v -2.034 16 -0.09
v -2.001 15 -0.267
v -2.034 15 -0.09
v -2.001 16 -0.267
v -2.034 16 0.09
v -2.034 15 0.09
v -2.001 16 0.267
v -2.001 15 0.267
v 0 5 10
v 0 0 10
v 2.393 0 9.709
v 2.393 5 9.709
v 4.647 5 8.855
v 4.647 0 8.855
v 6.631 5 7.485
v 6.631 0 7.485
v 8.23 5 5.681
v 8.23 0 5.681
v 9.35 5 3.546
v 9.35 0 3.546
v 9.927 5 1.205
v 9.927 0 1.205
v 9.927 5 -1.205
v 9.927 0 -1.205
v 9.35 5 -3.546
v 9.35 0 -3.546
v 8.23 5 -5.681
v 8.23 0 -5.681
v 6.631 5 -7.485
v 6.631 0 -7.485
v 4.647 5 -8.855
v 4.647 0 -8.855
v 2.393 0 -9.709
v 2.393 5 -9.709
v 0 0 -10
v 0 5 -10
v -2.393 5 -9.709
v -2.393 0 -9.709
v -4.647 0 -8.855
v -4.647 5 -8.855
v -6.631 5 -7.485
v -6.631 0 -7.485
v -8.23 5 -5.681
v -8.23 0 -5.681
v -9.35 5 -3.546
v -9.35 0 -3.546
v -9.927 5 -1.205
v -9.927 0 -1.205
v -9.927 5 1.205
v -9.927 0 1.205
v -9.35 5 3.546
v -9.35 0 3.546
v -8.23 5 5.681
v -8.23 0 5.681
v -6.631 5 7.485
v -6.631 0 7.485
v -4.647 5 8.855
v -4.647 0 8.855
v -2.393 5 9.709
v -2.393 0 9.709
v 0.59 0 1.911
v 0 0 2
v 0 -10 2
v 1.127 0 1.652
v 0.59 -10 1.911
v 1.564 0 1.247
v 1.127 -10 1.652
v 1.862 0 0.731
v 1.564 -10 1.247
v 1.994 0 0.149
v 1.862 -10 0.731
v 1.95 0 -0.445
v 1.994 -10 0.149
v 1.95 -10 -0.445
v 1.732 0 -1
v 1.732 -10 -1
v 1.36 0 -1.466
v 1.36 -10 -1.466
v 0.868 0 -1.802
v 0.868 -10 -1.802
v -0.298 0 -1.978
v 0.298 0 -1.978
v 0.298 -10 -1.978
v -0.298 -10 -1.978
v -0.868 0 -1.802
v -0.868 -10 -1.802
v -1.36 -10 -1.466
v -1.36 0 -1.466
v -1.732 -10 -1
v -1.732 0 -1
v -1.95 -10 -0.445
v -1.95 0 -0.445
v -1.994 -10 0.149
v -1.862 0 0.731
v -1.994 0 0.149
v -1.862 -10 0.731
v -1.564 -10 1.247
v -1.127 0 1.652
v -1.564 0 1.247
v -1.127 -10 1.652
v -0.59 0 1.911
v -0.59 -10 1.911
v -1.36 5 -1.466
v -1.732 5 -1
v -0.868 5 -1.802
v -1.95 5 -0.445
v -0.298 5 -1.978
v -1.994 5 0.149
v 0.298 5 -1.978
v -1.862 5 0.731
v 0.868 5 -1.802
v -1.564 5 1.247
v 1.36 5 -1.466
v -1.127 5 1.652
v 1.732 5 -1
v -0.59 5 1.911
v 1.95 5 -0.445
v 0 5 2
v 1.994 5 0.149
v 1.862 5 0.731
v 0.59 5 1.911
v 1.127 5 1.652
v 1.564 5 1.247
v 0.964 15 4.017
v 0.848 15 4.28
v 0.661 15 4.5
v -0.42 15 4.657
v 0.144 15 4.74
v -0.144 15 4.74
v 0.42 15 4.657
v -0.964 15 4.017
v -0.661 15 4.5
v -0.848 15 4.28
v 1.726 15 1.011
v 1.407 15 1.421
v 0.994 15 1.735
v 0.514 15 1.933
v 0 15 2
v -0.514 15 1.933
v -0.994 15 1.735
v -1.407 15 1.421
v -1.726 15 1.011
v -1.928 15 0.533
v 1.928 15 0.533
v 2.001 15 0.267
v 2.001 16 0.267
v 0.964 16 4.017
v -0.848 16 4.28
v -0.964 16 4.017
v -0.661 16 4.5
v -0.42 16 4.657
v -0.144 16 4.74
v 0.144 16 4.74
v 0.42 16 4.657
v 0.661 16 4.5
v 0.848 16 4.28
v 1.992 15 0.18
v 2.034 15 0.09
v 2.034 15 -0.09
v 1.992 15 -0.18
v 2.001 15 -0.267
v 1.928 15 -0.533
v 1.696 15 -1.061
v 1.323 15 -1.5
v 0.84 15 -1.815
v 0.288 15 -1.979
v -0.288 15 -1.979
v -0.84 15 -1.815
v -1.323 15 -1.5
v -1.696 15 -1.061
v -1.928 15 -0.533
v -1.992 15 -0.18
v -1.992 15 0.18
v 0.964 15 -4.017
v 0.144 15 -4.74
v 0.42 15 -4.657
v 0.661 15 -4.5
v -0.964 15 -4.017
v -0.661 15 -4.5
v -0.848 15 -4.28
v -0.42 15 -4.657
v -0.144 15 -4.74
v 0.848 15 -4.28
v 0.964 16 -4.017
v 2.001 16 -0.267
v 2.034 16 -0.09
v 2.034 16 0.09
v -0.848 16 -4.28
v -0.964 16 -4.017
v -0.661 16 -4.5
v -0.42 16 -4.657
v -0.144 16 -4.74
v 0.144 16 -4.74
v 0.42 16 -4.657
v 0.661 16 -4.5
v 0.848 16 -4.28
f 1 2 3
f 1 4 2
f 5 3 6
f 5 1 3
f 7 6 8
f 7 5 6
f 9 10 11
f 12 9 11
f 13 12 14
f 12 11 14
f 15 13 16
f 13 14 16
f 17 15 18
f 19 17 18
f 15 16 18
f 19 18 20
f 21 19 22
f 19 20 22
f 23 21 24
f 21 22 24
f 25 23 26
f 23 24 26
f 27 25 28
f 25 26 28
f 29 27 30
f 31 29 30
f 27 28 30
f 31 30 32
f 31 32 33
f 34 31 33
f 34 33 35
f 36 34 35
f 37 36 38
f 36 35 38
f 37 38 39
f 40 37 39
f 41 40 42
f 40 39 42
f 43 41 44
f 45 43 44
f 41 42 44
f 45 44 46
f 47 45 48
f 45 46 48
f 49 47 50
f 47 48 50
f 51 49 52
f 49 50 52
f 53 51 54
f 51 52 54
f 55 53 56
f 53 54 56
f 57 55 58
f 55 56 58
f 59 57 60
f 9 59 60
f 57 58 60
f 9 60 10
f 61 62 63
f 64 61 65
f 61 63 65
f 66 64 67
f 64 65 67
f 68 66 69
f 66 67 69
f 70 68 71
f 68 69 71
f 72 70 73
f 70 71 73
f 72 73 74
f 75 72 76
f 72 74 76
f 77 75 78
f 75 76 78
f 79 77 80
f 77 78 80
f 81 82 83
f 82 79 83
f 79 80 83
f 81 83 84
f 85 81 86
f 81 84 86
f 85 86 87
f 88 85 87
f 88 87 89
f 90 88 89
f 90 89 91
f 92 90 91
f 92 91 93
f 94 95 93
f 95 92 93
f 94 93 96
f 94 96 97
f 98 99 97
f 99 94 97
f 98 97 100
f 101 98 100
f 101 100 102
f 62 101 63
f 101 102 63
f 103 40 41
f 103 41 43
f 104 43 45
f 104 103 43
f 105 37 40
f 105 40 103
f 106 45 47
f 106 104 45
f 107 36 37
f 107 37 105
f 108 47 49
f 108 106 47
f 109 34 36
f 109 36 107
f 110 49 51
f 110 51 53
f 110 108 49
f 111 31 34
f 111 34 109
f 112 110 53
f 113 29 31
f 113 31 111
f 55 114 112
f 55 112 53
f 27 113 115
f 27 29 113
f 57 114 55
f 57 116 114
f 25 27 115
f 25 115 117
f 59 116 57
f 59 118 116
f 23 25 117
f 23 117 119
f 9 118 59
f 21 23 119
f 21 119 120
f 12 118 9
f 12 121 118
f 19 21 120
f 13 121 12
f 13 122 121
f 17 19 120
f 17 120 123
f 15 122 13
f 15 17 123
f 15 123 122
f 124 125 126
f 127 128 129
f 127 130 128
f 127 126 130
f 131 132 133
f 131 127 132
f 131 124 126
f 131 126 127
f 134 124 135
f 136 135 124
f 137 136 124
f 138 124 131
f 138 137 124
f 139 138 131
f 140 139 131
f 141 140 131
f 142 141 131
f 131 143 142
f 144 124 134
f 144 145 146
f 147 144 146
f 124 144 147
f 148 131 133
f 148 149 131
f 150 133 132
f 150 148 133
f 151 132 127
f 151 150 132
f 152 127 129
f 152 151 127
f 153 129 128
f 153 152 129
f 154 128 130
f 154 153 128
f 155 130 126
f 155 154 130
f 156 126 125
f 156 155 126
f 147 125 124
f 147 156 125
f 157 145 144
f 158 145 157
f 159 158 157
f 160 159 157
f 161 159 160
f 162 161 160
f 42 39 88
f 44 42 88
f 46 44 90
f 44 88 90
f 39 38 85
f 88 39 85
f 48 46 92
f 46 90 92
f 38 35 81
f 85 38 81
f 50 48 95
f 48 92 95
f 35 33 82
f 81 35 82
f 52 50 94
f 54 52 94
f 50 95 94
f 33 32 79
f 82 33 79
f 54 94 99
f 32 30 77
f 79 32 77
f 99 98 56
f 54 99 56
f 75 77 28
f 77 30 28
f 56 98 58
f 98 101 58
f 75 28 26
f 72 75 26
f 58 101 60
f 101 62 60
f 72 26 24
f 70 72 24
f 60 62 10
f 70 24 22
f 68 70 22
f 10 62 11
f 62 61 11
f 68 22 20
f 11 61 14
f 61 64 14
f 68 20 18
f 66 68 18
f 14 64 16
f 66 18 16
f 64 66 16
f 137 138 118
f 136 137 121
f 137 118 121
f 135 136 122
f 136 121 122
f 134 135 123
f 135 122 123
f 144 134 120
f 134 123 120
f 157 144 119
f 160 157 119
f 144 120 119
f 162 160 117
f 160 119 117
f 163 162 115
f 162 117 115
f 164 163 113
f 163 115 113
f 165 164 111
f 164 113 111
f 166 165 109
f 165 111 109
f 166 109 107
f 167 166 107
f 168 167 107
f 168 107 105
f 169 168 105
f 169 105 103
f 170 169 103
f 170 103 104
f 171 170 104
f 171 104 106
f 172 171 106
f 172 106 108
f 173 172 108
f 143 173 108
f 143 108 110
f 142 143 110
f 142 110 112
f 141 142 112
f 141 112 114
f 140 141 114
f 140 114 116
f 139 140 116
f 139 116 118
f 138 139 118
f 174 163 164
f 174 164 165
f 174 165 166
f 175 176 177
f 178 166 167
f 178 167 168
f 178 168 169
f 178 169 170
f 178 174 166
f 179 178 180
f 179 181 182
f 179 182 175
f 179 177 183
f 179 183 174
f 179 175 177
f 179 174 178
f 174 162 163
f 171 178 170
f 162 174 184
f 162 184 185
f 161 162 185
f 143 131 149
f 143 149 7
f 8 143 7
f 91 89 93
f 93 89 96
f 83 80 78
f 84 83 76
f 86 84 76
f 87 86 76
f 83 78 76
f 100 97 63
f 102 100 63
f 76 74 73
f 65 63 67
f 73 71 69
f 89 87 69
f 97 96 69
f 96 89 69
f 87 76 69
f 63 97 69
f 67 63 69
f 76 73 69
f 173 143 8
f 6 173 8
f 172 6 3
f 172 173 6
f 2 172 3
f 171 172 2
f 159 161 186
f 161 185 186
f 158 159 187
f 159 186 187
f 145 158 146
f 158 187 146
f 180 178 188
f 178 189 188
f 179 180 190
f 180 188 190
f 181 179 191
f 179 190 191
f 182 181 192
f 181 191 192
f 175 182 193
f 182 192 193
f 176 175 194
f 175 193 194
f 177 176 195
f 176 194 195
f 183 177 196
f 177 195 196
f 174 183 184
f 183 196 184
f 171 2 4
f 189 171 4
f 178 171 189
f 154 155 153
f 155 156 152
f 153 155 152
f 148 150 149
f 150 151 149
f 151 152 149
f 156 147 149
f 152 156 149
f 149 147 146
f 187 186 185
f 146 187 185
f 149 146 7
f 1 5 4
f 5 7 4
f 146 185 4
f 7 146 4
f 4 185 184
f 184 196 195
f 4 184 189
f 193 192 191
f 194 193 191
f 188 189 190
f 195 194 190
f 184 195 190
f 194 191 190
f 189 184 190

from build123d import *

# Parameters (mm, degrees)
CROQUIS1_R                   = 10
SALIENTE_EXTRUIR1_DEPTH      = 5
SALIENTE_EXTRUIR2_DEPTH      = 10
SALIENTE_EXTRUIR2_DEPTH_BACK = 15
CROQUIS2_R                   = 2
SALIENTE_EXTRUIR3_DEPTH      = 1
REDONDEO1_R                  = 1


with BuildPart() as part:
    # Croquis1 → Saliente-Extruir1 (new body)
    with BuildSketch(Plane(origin=(0, 0, 0), x_dir=(1, 0, 0), z_dir=(0, 1, 0))):
        with Locations(Location((0, 0, 0), (0, 0, 270))):
            Circle(CROQUIS1_R)
    extrude(amount=SALIENTE_EXTRUIR1_DEPTH)

    # Croquis2 → Saliente-Extruir2 (add, two sides: drawn at the far end of the back side and taken through both)
    with BuildSketch(Plane(origin=(0, 5, 0), x_dir=(1, 0, 0), z_dir=(0, 1, 0)).offset(-SALIENTE_EXTRUIR2_DEPTH_BACK)):
        with Locations(Location((0, 0, 0), (0, 0, 270))):
            Circle(CROQUIS2_R)
    extrude(amount=SALIENTE_EXTRUIR2_DEPTH + SALIENTE_EXTRUIR2_DEPTH_BACK)

    # Croquis3 → Saliente-Extruir3 (add)
    with BuildSketch(Plane(origin=(0, 15, 0), x_dir=(1, 0, 0), z_dir=(0, 1, 0))):
        Polygon((-2.075143392, 0), (0, 7.5), (2.075143392, 0), (0, -7.5), align=None)
    extrude(amount=SALIENTE_EXTRUIR3_DEPTH)

    # Redondeo1
    redondeo1_edges = [part.edges().sort_by_distance(p)[0] for p in [
        (-2.075143392, 15.5, 0),
        (0, 15.5, 7.5),
        (2.075143392, 15.5, 0),
        (0, 15.5, -7.5),
    ]]
    fillet(redondeo1_edges, radius=REDONDEO1_R)


solid = part.part
